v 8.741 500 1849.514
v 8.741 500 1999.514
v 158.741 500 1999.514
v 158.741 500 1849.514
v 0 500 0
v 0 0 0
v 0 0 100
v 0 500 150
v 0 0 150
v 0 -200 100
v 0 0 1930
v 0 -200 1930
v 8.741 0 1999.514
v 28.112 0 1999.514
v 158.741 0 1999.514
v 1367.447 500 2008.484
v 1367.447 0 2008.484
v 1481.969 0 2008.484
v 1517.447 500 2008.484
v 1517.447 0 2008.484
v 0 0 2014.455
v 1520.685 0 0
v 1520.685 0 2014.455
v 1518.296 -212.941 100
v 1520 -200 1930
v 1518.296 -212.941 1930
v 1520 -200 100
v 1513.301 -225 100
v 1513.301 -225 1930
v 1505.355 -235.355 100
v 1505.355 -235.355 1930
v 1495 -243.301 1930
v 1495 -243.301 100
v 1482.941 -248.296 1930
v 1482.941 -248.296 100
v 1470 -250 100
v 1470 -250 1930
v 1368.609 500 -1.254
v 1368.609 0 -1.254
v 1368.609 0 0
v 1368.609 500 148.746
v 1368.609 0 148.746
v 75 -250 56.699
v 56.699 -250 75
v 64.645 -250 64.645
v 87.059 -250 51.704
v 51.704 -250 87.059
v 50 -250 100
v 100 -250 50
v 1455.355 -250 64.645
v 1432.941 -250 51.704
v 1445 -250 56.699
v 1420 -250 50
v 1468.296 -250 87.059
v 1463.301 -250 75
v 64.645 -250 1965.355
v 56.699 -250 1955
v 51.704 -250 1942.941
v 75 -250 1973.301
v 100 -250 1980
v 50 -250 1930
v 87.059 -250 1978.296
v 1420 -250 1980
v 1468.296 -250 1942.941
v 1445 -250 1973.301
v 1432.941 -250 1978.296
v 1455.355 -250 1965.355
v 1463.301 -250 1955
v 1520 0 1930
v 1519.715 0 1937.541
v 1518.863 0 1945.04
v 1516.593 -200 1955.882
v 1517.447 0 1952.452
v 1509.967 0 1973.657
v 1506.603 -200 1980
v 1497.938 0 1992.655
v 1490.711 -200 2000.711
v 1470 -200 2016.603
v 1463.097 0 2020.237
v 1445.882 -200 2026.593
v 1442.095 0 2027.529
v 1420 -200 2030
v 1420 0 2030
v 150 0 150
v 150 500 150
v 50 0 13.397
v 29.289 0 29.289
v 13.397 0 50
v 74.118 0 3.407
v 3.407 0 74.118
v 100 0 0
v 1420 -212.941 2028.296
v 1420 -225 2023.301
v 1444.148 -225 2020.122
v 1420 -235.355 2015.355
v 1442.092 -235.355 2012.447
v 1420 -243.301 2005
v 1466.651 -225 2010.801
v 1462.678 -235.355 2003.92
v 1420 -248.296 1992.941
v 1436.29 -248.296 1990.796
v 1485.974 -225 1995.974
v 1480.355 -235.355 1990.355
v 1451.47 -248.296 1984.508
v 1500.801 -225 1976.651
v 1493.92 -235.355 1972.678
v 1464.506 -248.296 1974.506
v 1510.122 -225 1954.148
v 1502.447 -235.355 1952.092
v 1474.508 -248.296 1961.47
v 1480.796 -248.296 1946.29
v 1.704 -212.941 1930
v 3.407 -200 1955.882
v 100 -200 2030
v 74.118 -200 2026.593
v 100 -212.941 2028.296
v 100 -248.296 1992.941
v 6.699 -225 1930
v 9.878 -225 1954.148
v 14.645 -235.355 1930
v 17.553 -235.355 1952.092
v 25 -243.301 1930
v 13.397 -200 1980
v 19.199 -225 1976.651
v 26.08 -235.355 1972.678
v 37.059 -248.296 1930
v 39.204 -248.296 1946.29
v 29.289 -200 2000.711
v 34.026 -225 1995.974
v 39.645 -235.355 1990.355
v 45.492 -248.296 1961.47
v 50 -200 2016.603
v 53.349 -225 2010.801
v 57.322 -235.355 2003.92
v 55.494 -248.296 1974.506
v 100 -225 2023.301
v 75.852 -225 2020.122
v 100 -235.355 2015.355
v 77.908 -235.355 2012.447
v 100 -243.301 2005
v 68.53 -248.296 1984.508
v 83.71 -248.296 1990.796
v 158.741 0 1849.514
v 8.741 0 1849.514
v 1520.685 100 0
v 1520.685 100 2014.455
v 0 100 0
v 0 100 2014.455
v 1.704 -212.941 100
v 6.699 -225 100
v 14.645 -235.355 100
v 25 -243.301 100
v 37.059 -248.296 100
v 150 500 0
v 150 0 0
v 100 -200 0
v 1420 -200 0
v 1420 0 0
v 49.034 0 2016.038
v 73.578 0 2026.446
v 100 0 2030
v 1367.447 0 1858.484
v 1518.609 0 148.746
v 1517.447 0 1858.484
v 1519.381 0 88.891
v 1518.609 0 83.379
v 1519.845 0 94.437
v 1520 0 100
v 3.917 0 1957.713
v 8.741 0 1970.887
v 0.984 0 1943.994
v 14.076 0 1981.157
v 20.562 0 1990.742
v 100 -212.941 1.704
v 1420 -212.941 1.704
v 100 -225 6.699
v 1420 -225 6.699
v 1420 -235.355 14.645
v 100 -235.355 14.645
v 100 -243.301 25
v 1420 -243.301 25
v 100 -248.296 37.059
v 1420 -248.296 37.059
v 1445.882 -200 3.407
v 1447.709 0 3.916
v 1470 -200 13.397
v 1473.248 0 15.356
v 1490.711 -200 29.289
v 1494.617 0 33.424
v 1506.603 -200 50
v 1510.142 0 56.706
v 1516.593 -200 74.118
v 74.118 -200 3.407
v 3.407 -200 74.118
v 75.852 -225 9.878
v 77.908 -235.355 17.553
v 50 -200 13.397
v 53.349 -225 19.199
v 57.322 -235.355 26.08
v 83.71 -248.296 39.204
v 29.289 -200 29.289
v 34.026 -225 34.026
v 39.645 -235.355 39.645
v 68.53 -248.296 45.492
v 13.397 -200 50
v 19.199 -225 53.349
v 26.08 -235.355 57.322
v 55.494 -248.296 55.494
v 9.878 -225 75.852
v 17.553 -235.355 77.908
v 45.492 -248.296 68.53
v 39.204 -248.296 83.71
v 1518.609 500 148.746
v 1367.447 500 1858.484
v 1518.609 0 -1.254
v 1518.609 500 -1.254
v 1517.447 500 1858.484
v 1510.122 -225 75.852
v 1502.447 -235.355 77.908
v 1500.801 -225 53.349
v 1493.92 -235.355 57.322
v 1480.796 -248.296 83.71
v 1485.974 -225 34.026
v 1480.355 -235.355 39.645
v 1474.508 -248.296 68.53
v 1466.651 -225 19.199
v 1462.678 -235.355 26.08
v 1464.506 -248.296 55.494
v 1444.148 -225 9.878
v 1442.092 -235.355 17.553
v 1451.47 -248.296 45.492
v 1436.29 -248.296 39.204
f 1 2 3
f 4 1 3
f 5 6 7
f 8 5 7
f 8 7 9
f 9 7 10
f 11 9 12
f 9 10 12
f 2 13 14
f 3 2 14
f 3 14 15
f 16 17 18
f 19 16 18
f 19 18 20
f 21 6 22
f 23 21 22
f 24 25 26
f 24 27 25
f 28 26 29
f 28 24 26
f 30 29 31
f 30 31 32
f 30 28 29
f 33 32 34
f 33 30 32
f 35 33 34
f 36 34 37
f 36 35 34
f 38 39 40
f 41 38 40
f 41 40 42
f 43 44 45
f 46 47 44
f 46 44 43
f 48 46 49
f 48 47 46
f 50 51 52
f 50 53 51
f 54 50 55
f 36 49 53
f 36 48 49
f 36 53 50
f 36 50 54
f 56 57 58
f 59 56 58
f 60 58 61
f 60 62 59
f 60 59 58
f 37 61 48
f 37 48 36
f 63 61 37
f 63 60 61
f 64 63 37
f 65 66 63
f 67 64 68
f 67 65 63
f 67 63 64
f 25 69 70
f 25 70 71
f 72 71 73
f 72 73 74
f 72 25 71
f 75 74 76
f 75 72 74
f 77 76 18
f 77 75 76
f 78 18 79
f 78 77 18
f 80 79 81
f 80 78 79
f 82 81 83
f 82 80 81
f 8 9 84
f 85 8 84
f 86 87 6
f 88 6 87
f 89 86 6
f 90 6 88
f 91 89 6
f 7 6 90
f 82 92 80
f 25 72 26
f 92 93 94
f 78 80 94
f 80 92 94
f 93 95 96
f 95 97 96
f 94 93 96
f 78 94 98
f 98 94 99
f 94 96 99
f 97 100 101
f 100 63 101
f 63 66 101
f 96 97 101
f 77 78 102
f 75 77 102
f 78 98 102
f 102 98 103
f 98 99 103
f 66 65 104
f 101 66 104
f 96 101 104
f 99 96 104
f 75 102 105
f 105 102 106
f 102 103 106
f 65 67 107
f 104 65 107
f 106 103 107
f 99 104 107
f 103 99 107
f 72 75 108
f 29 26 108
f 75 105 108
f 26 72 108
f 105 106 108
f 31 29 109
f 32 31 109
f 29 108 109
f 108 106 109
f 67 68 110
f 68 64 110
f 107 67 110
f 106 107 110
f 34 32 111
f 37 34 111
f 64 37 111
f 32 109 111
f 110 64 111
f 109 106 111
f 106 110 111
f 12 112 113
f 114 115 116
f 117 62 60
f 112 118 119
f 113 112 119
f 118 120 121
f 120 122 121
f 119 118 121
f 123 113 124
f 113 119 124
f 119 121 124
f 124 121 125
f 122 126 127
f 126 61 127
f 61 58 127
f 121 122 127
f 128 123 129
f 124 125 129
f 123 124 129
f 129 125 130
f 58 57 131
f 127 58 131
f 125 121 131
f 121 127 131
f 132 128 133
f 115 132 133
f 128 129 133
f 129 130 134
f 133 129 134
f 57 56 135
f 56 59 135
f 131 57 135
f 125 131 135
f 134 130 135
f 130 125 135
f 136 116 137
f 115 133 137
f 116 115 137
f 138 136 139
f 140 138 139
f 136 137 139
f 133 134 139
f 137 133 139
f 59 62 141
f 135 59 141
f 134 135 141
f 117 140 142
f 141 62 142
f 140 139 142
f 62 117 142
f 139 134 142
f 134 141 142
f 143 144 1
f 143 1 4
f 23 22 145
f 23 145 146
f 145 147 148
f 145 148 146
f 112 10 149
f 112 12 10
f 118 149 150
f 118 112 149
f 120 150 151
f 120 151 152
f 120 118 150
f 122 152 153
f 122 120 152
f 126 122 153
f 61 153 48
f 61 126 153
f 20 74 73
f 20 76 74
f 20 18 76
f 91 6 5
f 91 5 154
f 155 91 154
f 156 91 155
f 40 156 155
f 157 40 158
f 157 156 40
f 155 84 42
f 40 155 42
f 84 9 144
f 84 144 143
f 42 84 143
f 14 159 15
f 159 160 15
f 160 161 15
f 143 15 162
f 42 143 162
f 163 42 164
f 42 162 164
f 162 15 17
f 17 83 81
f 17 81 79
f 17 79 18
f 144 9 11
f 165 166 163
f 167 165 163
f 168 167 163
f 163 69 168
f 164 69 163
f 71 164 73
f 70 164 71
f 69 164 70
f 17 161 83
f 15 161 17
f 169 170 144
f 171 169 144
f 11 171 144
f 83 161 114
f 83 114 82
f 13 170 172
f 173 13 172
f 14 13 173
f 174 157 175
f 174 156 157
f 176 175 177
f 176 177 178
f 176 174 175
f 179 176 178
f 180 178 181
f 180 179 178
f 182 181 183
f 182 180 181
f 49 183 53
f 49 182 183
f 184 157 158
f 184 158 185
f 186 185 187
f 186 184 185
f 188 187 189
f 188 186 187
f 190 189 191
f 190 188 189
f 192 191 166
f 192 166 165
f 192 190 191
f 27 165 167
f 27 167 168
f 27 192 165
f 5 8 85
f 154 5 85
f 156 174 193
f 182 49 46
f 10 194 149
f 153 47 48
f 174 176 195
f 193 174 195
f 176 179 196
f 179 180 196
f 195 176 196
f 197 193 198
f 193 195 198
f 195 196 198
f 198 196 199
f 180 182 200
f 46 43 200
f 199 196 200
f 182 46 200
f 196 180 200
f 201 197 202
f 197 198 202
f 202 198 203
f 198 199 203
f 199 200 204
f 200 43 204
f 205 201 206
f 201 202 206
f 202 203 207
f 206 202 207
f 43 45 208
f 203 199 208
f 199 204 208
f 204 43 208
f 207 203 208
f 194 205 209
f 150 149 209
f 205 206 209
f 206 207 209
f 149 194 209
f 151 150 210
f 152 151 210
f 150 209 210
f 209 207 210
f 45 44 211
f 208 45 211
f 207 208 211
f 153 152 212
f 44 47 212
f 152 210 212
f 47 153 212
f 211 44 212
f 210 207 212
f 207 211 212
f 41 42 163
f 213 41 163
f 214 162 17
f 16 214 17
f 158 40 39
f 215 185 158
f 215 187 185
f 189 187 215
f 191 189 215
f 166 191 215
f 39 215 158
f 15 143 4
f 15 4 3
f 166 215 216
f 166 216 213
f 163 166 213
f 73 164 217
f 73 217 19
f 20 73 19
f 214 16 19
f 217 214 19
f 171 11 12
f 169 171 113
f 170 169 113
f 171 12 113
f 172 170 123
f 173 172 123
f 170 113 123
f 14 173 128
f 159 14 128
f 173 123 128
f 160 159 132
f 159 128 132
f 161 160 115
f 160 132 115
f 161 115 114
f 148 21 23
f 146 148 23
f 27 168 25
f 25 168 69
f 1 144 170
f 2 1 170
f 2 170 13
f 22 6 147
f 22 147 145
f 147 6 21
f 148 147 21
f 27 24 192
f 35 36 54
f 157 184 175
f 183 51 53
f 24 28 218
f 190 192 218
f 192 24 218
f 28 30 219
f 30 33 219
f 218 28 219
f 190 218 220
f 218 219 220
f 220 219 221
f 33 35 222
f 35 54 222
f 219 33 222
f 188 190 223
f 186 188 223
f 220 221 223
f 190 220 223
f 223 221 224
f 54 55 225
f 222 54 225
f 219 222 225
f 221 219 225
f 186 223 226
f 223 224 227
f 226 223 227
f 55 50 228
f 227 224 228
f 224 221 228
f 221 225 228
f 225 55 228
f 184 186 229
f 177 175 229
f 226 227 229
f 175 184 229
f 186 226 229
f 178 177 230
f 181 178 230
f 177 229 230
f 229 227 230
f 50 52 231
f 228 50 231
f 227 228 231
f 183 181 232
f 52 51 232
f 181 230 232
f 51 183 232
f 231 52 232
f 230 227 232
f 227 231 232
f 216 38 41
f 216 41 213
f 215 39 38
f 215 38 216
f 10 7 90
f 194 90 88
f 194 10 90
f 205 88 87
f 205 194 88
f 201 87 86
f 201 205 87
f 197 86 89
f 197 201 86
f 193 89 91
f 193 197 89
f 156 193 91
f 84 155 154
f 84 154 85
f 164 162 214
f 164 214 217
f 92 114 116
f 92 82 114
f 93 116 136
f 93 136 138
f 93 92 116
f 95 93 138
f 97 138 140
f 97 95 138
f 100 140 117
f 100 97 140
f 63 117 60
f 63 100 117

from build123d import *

# Parameters (mm, degrees)
SKETCH_W     = 1520
SKETCH_H     = 2030
PAD_DEPTH    = 250
FILLET_R     = 100
SKETCH002_W  = 150
SKETCH002_H  = 150
PAD002_DEPTH = 500
SKETCH003_W  = 150
SKETCH003_H  = 150
PAD003_DEPTH = 500
SKETCH004_W  = 150
SKETCH004_H  = 150
PAD004_DEPTH = 500
SKETCH005_W  = 150
SKETCH005_H  = 150
PAD005_DEPTH = 500
FILLET001_R  = 50
SKETCH001_W  = 1520.684692
SKETCH001_H  = 2014.4552
PAD001_DEPTH = 100


with BuildPart() as body:
    # Sketch → Pad (new body)
    with BuildSketch(Plane.XZ):
        with Locations((760, 1015)):
            Rectangle(SKETCH_W, SKETCH_H)
    extrude(amount=PAD_DEPTH)

    # Fillet
    fillet_edges = [body.edges().sort_by_distance(p)[0] for p in [
        (0, -125, 2030),
        (1520, -125, 0),
        (0, -125, 0),
        (1520, -125, 2030),
    ]]
    fillet(fillet_edges, radius=FILLET_R)

    # Sketch002 → Pad002 (join)
    with BuildSketch(Plane.XZ):
        with Locations((75, 75)):
            Rectangle(SKETCH002_W, SKETCH002_H)
    extrude(amount=-PAD002_DEPTH)

    # Sketch003 → Pad003 (join)
    with BuildSketch(Plane.XZ):
        with Locations((83.740668, 1924.513916)):
            Rectangle(SKETCH003_W, SKETCH003_H)
    extrude(amount=-PAD003_DEPTH)

    # Sketch004 → Pad004 (join)
    with BuildSketch(Plane.XZ):
        with Locations((1442.446899, 1933.484497)):
            Rectangle(SKETCH004_W, SKETCH004_H)
    extrude(amount=-PAD004_DEPTH)

    # Sketch005 → Pad005 (join)
    with BuildSketch(Plane.XZ):
        with Locations((1443.609009, 73.745581)):
            Rectangle(SKETCH005_W, SKETCH005_H)
    extrude(amount=-PAD005_DEPTH)

    # Fillet001
    fillet001_edges = [body.edges().sort_by_distance(p)[0] for p in [
        (0, -250, 1015),
        (29.289322, -250, 2000.710678),
        (760, -250, 2030),
        (1490.710678, -250, 2000.710678),
        (1520, -250, 1015),
        (1490.710678, -250, 29.289322),
        (760, -250, 0),
        (29.289322, -250, 29.289322),
    ]]
    fillet(fillet001_edges, radius=FILLET001_R)


with BuildPart() as body001:
    # Sketch001 → Pad001 (new body)
    with BuildSketch(Plane.XZ):
        with Locations((760.342346, 1007.2276)):
            Rectangle(SKETCH001_W, SKETCH001_H)
    extrude(amount=-PAD001_DEPTH)


solid = Compound([body.part, body001.part])
